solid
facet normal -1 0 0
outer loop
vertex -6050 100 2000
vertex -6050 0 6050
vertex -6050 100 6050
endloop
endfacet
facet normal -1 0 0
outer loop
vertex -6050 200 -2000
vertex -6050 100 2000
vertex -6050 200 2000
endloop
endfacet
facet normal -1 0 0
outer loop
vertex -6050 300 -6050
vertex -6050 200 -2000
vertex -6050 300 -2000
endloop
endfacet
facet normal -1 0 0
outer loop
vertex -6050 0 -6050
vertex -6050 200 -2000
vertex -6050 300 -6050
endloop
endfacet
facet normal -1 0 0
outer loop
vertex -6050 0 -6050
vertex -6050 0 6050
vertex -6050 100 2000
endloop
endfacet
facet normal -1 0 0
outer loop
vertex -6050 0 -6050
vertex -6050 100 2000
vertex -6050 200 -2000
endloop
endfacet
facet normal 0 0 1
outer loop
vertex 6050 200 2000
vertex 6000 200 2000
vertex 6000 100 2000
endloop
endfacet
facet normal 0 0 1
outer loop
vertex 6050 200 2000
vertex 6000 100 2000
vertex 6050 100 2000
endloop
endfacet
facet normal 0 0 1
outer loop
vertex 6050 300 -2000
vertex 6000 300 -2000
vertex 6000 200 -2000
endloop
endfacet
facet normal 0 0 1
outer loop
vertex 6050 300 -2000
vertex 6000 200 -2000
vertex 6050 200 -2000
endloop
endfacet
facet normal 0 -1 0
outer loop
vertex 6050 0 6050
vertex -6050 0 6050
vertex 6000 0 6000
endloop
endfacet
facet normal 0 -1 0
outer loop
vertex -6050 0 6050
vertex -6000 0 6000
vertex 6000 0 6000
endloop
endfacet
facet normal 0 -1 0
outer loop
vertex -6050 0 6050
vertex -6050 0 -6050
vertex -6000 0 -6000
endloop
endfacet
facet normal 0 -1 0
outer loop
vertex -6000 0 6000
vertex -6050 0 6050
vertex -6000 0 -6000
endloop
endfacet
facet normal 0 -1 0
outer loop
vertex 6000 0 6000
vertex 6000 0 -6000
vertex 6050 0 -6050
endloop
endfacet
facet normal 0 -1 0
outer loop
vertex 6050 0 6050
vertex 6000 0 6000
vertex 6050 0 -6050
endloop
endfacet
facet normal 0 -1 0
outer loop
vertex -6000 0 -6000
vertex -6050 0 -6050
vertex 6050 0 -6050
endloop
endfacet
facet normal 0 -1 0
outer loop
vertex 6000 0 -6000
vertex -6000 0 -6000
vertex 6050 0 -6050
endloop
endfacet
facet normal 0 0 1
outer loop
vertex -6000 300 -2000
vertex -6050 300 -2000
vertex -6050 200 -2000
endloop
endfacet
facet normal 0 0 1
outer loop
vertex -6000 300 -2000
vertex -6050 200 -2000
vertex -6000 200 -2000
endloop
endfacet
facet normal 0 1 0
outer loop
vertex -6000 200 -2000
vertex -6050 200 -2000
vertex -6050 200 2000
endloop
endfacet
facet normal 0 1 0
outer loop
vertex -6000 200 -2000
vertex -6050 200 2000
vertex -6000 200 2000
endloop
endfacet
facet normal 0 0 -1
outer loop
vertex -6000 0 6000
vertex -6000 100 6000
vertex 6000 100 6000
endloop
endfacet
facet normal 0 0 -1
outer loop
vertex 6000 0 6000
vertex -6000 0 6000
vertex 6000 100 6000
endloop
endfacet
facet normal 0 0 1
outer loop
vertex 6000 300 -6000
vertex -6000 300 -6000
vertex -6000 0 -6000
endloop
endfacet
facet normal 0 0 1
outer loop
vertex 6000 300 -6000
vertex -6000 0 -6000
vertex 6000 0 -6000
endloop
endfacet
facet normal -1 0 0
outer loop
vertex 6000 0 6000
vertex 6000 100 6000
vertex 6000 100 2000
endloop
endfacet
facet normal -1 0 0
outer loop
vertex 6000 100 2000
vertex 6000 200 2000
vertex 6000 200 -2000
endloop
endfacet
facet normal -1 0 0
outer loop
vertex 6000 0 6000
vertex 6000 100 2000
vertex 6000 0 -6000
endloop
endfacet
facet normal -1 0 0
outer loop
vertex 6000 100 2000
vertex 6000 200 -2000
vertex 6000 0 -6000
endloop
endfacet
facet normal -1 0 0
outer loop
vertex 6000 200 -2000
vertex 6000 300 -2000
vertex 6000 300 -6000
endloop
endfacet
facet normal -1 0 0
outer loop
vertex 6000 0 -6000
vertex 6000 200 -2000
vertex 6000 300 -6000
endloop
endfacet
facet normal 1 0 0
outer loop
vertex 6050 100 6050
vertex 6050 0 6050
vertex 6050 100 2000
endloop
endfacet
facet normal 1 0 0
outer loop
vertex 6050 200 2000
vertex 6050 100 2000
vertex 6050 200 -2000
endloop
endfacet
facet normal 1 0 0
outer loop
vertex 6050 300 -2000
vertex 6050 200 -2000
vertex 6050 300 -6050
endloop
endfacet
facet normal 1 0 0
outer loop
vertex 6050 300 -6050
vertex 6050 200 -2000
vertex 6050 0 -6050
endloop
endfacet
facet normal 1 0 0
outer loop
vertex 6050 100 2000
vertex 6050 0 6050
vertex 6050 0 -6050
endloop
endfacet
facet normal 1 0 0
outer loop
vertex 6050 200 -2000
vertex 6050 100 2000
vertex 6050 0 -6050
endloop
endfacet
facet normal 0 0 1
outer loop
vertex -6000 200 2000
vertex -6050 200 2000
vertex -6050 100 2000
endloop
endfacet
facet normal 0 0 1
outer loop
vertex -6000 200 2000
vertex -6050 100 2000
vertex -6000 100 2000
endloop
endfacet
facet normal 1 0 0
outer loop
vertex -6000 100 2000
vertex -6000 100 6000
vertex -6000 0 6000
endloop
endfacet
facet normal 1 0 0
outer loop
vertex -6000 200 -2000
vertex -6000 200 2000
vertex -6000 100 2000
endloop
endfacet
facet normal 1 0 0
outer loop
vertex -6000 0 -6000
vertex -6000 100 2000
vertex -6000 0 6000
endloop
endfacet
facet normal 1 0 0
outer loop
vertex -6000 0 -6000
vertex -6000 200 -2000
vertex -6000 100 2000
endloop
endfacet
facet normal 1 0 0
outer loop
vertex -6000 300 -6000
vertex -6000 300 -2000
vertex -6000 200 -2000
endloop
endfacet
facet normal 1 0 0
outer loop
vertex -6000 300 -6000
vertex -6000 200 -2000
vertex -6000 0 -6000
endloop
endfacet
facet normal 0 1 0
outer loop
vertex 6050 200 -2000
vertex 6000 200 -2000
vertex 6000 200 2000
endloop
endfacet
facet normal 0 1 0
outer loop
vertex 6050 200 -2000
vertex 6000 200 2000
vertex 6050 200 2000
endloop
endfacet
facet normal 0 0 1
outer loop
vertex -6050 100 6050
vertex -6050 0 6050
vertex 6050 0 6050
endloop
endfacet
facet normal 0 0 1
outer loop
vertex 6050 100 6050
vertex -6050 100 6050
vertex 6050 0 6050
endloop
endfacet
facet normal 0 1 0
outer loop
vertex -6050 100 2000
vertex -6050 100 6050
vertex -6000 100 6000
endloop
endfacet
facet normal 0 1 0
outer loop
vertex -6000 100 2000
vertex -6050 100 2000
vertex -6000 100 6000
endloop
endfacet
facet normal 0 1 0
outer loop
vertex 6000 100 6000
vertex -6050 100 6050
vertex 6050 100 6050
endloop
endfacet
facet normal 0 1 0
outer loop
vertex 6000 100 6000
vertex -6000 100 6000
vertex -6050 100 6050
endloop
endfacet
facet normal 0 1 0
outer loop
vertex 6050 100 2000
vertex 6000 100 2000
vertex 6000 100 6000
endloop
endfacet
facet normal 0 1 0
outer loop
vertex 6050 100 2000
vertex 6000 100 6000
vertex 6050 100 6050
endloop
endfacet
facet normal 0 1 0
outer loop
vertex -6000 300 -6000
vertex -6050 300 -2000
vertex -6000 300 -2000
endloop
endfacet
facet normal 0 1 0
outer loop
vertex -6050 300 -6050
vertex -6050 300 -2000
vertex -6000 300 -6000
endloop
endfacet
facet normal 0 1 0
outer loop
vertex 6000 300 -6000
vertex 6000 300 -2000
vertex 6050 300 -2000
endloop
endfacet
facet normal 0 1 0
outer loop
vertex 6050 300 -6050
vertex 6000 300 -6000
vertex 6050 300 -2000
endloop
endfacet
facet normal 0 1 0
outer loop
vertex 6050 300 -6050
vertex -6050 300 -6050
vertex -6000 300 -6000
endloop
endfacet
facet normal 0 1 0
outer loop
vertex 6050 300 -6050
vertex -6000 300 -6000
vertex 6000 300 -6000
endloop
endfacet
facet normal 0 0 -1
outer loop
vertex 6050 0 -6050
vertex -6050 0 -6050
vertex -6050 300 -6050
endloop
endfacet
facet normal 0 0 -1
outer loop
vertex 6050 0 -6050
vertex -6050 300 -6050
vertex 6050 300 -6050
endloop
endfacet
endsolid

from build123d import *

# Parameters (mm, degrees)
SKETCH2_W           = 12100
SKETCH2_H           = 12100
BOSS_EXTRUDE2_DEPTH = 300
SKETCH3_W           = 12000
SKETCH3_H           = 12000
CUT_EXTRUDE1_DEPTH  = 301
SKETCH5_W           = 50
SKETCH5_H           = 4000
CUT_EXTRUDE2_DEPTH  = 200
SKETCH6_W           = 50
SKETCH6_H           = 4000
CUT_EXTRUDE3_DEPTH  = 100
SKETCH7_W           = 50
SKETCH7_H           = 4000
CUT_EXTRUDE4_DEPTH  = 200
SKETCH8_W           = 50
SKETCH8_H           = 4000
CUT_EXTRUDE5_DEPTH  = 100
SKETCH10_W          = 12100
SKETCH10_H          = 50
CUT_EXTRUDE6_DEPTH  = 200


with BuildPart() as part:
    # Sketch2 → Boss-Extrude2 (new body)
    with BuildSketch(Plane(origin=(0, 0, 0), x_dir=(1, 0, 0), z_dir=(0, 1, 0))):
        Rectangle(SKETCH2_W, SKETCH2_H)
    extrude(amount=BOSS_EXTRUDE2_DEPTH)

    # Sketch3 → Cut-Extrude1 (cut)
    with BuildSketch(Plane(origin=(0, 300, 0), x_dir=(1, 0, 0), z_dir=(0, 1, 0))):
        Rectangle(SKETCH3_W, SKETCH3_H)
    extrude(amount=-CUT_EXTRUDE1_DEPTH, mode=Mode.SUBTRACT)

    # Sketch5 → Cut-Extrude2 (cut)
    with BuildSketch(Plane(origin=(0, 300, 0), x_dir=(1, 0, 0), z_dir=(0, 1, 0))):
        with Locations((-6025, -4000)):
            Rectangle(SKETCH5_W, SKETCH5_H)
    extrude(amount=-CUT_EXTRUDE2_DEPTH, mode=Mode.SUBTRACT)

    # Sketch6 → Cut-Extrude3 (cut)
    with BuildSketch(Plane(origin=(0, 300, 0), x_dir=(1, 0, 0), z_dir=(0, 1, 0))):
        with Locations((-6025, 0)):
            Rectangle(SKETCH6_W, SKETCH6_H)
    extrude(amount=-CUT_EXTRUDE3_DEPTH, mode=Mode.SUBTRACT)

    # Sketch7 → Cut-Extrude4 (cut)
    with BuildSketch(Plane(origin=(0, 300, 0), x_dir=(1, 0, 0), z_dir=(0, 1, 0))):
        with Locations((6025, -4000)):
            Rectangle(SKETCH7_W, SKETCH7_H)
    extrude(amount=-CUT_EXTRUDE4_DEPTH, mode=Mode.SUBTRACT)

    # Sketch8 → Cut-Extrude5 (cut)
    with BuildSketch(Plane(origin=(0, 300, 0), x_dir=(1, 0, 0), z_dir=(0, 1, 0))):
        with Locations((6025, 0)):
            Rectangle(SKETCH8_W, SKETCH8_H)
    extrude(amount=-CUT_EXTRUDE5_DEPTH, mode=Mode.SUBTRACT)

    # Sketch10 → Cut-Extrude6 (cut)
    with BuildSketch(Plane(origin=(0, 300, 0), x_dir=(1, 0, 0), z_dir=(0, 1, 0))):
        with Locations((0, -6025)):
            Rectangle(SKETCH10_W, SKETCH10_H)
    extrude(amount=-CUT_EXTRUDE6_DEPTH, mode=Mode.SUBTRACT)


solid = part.part
